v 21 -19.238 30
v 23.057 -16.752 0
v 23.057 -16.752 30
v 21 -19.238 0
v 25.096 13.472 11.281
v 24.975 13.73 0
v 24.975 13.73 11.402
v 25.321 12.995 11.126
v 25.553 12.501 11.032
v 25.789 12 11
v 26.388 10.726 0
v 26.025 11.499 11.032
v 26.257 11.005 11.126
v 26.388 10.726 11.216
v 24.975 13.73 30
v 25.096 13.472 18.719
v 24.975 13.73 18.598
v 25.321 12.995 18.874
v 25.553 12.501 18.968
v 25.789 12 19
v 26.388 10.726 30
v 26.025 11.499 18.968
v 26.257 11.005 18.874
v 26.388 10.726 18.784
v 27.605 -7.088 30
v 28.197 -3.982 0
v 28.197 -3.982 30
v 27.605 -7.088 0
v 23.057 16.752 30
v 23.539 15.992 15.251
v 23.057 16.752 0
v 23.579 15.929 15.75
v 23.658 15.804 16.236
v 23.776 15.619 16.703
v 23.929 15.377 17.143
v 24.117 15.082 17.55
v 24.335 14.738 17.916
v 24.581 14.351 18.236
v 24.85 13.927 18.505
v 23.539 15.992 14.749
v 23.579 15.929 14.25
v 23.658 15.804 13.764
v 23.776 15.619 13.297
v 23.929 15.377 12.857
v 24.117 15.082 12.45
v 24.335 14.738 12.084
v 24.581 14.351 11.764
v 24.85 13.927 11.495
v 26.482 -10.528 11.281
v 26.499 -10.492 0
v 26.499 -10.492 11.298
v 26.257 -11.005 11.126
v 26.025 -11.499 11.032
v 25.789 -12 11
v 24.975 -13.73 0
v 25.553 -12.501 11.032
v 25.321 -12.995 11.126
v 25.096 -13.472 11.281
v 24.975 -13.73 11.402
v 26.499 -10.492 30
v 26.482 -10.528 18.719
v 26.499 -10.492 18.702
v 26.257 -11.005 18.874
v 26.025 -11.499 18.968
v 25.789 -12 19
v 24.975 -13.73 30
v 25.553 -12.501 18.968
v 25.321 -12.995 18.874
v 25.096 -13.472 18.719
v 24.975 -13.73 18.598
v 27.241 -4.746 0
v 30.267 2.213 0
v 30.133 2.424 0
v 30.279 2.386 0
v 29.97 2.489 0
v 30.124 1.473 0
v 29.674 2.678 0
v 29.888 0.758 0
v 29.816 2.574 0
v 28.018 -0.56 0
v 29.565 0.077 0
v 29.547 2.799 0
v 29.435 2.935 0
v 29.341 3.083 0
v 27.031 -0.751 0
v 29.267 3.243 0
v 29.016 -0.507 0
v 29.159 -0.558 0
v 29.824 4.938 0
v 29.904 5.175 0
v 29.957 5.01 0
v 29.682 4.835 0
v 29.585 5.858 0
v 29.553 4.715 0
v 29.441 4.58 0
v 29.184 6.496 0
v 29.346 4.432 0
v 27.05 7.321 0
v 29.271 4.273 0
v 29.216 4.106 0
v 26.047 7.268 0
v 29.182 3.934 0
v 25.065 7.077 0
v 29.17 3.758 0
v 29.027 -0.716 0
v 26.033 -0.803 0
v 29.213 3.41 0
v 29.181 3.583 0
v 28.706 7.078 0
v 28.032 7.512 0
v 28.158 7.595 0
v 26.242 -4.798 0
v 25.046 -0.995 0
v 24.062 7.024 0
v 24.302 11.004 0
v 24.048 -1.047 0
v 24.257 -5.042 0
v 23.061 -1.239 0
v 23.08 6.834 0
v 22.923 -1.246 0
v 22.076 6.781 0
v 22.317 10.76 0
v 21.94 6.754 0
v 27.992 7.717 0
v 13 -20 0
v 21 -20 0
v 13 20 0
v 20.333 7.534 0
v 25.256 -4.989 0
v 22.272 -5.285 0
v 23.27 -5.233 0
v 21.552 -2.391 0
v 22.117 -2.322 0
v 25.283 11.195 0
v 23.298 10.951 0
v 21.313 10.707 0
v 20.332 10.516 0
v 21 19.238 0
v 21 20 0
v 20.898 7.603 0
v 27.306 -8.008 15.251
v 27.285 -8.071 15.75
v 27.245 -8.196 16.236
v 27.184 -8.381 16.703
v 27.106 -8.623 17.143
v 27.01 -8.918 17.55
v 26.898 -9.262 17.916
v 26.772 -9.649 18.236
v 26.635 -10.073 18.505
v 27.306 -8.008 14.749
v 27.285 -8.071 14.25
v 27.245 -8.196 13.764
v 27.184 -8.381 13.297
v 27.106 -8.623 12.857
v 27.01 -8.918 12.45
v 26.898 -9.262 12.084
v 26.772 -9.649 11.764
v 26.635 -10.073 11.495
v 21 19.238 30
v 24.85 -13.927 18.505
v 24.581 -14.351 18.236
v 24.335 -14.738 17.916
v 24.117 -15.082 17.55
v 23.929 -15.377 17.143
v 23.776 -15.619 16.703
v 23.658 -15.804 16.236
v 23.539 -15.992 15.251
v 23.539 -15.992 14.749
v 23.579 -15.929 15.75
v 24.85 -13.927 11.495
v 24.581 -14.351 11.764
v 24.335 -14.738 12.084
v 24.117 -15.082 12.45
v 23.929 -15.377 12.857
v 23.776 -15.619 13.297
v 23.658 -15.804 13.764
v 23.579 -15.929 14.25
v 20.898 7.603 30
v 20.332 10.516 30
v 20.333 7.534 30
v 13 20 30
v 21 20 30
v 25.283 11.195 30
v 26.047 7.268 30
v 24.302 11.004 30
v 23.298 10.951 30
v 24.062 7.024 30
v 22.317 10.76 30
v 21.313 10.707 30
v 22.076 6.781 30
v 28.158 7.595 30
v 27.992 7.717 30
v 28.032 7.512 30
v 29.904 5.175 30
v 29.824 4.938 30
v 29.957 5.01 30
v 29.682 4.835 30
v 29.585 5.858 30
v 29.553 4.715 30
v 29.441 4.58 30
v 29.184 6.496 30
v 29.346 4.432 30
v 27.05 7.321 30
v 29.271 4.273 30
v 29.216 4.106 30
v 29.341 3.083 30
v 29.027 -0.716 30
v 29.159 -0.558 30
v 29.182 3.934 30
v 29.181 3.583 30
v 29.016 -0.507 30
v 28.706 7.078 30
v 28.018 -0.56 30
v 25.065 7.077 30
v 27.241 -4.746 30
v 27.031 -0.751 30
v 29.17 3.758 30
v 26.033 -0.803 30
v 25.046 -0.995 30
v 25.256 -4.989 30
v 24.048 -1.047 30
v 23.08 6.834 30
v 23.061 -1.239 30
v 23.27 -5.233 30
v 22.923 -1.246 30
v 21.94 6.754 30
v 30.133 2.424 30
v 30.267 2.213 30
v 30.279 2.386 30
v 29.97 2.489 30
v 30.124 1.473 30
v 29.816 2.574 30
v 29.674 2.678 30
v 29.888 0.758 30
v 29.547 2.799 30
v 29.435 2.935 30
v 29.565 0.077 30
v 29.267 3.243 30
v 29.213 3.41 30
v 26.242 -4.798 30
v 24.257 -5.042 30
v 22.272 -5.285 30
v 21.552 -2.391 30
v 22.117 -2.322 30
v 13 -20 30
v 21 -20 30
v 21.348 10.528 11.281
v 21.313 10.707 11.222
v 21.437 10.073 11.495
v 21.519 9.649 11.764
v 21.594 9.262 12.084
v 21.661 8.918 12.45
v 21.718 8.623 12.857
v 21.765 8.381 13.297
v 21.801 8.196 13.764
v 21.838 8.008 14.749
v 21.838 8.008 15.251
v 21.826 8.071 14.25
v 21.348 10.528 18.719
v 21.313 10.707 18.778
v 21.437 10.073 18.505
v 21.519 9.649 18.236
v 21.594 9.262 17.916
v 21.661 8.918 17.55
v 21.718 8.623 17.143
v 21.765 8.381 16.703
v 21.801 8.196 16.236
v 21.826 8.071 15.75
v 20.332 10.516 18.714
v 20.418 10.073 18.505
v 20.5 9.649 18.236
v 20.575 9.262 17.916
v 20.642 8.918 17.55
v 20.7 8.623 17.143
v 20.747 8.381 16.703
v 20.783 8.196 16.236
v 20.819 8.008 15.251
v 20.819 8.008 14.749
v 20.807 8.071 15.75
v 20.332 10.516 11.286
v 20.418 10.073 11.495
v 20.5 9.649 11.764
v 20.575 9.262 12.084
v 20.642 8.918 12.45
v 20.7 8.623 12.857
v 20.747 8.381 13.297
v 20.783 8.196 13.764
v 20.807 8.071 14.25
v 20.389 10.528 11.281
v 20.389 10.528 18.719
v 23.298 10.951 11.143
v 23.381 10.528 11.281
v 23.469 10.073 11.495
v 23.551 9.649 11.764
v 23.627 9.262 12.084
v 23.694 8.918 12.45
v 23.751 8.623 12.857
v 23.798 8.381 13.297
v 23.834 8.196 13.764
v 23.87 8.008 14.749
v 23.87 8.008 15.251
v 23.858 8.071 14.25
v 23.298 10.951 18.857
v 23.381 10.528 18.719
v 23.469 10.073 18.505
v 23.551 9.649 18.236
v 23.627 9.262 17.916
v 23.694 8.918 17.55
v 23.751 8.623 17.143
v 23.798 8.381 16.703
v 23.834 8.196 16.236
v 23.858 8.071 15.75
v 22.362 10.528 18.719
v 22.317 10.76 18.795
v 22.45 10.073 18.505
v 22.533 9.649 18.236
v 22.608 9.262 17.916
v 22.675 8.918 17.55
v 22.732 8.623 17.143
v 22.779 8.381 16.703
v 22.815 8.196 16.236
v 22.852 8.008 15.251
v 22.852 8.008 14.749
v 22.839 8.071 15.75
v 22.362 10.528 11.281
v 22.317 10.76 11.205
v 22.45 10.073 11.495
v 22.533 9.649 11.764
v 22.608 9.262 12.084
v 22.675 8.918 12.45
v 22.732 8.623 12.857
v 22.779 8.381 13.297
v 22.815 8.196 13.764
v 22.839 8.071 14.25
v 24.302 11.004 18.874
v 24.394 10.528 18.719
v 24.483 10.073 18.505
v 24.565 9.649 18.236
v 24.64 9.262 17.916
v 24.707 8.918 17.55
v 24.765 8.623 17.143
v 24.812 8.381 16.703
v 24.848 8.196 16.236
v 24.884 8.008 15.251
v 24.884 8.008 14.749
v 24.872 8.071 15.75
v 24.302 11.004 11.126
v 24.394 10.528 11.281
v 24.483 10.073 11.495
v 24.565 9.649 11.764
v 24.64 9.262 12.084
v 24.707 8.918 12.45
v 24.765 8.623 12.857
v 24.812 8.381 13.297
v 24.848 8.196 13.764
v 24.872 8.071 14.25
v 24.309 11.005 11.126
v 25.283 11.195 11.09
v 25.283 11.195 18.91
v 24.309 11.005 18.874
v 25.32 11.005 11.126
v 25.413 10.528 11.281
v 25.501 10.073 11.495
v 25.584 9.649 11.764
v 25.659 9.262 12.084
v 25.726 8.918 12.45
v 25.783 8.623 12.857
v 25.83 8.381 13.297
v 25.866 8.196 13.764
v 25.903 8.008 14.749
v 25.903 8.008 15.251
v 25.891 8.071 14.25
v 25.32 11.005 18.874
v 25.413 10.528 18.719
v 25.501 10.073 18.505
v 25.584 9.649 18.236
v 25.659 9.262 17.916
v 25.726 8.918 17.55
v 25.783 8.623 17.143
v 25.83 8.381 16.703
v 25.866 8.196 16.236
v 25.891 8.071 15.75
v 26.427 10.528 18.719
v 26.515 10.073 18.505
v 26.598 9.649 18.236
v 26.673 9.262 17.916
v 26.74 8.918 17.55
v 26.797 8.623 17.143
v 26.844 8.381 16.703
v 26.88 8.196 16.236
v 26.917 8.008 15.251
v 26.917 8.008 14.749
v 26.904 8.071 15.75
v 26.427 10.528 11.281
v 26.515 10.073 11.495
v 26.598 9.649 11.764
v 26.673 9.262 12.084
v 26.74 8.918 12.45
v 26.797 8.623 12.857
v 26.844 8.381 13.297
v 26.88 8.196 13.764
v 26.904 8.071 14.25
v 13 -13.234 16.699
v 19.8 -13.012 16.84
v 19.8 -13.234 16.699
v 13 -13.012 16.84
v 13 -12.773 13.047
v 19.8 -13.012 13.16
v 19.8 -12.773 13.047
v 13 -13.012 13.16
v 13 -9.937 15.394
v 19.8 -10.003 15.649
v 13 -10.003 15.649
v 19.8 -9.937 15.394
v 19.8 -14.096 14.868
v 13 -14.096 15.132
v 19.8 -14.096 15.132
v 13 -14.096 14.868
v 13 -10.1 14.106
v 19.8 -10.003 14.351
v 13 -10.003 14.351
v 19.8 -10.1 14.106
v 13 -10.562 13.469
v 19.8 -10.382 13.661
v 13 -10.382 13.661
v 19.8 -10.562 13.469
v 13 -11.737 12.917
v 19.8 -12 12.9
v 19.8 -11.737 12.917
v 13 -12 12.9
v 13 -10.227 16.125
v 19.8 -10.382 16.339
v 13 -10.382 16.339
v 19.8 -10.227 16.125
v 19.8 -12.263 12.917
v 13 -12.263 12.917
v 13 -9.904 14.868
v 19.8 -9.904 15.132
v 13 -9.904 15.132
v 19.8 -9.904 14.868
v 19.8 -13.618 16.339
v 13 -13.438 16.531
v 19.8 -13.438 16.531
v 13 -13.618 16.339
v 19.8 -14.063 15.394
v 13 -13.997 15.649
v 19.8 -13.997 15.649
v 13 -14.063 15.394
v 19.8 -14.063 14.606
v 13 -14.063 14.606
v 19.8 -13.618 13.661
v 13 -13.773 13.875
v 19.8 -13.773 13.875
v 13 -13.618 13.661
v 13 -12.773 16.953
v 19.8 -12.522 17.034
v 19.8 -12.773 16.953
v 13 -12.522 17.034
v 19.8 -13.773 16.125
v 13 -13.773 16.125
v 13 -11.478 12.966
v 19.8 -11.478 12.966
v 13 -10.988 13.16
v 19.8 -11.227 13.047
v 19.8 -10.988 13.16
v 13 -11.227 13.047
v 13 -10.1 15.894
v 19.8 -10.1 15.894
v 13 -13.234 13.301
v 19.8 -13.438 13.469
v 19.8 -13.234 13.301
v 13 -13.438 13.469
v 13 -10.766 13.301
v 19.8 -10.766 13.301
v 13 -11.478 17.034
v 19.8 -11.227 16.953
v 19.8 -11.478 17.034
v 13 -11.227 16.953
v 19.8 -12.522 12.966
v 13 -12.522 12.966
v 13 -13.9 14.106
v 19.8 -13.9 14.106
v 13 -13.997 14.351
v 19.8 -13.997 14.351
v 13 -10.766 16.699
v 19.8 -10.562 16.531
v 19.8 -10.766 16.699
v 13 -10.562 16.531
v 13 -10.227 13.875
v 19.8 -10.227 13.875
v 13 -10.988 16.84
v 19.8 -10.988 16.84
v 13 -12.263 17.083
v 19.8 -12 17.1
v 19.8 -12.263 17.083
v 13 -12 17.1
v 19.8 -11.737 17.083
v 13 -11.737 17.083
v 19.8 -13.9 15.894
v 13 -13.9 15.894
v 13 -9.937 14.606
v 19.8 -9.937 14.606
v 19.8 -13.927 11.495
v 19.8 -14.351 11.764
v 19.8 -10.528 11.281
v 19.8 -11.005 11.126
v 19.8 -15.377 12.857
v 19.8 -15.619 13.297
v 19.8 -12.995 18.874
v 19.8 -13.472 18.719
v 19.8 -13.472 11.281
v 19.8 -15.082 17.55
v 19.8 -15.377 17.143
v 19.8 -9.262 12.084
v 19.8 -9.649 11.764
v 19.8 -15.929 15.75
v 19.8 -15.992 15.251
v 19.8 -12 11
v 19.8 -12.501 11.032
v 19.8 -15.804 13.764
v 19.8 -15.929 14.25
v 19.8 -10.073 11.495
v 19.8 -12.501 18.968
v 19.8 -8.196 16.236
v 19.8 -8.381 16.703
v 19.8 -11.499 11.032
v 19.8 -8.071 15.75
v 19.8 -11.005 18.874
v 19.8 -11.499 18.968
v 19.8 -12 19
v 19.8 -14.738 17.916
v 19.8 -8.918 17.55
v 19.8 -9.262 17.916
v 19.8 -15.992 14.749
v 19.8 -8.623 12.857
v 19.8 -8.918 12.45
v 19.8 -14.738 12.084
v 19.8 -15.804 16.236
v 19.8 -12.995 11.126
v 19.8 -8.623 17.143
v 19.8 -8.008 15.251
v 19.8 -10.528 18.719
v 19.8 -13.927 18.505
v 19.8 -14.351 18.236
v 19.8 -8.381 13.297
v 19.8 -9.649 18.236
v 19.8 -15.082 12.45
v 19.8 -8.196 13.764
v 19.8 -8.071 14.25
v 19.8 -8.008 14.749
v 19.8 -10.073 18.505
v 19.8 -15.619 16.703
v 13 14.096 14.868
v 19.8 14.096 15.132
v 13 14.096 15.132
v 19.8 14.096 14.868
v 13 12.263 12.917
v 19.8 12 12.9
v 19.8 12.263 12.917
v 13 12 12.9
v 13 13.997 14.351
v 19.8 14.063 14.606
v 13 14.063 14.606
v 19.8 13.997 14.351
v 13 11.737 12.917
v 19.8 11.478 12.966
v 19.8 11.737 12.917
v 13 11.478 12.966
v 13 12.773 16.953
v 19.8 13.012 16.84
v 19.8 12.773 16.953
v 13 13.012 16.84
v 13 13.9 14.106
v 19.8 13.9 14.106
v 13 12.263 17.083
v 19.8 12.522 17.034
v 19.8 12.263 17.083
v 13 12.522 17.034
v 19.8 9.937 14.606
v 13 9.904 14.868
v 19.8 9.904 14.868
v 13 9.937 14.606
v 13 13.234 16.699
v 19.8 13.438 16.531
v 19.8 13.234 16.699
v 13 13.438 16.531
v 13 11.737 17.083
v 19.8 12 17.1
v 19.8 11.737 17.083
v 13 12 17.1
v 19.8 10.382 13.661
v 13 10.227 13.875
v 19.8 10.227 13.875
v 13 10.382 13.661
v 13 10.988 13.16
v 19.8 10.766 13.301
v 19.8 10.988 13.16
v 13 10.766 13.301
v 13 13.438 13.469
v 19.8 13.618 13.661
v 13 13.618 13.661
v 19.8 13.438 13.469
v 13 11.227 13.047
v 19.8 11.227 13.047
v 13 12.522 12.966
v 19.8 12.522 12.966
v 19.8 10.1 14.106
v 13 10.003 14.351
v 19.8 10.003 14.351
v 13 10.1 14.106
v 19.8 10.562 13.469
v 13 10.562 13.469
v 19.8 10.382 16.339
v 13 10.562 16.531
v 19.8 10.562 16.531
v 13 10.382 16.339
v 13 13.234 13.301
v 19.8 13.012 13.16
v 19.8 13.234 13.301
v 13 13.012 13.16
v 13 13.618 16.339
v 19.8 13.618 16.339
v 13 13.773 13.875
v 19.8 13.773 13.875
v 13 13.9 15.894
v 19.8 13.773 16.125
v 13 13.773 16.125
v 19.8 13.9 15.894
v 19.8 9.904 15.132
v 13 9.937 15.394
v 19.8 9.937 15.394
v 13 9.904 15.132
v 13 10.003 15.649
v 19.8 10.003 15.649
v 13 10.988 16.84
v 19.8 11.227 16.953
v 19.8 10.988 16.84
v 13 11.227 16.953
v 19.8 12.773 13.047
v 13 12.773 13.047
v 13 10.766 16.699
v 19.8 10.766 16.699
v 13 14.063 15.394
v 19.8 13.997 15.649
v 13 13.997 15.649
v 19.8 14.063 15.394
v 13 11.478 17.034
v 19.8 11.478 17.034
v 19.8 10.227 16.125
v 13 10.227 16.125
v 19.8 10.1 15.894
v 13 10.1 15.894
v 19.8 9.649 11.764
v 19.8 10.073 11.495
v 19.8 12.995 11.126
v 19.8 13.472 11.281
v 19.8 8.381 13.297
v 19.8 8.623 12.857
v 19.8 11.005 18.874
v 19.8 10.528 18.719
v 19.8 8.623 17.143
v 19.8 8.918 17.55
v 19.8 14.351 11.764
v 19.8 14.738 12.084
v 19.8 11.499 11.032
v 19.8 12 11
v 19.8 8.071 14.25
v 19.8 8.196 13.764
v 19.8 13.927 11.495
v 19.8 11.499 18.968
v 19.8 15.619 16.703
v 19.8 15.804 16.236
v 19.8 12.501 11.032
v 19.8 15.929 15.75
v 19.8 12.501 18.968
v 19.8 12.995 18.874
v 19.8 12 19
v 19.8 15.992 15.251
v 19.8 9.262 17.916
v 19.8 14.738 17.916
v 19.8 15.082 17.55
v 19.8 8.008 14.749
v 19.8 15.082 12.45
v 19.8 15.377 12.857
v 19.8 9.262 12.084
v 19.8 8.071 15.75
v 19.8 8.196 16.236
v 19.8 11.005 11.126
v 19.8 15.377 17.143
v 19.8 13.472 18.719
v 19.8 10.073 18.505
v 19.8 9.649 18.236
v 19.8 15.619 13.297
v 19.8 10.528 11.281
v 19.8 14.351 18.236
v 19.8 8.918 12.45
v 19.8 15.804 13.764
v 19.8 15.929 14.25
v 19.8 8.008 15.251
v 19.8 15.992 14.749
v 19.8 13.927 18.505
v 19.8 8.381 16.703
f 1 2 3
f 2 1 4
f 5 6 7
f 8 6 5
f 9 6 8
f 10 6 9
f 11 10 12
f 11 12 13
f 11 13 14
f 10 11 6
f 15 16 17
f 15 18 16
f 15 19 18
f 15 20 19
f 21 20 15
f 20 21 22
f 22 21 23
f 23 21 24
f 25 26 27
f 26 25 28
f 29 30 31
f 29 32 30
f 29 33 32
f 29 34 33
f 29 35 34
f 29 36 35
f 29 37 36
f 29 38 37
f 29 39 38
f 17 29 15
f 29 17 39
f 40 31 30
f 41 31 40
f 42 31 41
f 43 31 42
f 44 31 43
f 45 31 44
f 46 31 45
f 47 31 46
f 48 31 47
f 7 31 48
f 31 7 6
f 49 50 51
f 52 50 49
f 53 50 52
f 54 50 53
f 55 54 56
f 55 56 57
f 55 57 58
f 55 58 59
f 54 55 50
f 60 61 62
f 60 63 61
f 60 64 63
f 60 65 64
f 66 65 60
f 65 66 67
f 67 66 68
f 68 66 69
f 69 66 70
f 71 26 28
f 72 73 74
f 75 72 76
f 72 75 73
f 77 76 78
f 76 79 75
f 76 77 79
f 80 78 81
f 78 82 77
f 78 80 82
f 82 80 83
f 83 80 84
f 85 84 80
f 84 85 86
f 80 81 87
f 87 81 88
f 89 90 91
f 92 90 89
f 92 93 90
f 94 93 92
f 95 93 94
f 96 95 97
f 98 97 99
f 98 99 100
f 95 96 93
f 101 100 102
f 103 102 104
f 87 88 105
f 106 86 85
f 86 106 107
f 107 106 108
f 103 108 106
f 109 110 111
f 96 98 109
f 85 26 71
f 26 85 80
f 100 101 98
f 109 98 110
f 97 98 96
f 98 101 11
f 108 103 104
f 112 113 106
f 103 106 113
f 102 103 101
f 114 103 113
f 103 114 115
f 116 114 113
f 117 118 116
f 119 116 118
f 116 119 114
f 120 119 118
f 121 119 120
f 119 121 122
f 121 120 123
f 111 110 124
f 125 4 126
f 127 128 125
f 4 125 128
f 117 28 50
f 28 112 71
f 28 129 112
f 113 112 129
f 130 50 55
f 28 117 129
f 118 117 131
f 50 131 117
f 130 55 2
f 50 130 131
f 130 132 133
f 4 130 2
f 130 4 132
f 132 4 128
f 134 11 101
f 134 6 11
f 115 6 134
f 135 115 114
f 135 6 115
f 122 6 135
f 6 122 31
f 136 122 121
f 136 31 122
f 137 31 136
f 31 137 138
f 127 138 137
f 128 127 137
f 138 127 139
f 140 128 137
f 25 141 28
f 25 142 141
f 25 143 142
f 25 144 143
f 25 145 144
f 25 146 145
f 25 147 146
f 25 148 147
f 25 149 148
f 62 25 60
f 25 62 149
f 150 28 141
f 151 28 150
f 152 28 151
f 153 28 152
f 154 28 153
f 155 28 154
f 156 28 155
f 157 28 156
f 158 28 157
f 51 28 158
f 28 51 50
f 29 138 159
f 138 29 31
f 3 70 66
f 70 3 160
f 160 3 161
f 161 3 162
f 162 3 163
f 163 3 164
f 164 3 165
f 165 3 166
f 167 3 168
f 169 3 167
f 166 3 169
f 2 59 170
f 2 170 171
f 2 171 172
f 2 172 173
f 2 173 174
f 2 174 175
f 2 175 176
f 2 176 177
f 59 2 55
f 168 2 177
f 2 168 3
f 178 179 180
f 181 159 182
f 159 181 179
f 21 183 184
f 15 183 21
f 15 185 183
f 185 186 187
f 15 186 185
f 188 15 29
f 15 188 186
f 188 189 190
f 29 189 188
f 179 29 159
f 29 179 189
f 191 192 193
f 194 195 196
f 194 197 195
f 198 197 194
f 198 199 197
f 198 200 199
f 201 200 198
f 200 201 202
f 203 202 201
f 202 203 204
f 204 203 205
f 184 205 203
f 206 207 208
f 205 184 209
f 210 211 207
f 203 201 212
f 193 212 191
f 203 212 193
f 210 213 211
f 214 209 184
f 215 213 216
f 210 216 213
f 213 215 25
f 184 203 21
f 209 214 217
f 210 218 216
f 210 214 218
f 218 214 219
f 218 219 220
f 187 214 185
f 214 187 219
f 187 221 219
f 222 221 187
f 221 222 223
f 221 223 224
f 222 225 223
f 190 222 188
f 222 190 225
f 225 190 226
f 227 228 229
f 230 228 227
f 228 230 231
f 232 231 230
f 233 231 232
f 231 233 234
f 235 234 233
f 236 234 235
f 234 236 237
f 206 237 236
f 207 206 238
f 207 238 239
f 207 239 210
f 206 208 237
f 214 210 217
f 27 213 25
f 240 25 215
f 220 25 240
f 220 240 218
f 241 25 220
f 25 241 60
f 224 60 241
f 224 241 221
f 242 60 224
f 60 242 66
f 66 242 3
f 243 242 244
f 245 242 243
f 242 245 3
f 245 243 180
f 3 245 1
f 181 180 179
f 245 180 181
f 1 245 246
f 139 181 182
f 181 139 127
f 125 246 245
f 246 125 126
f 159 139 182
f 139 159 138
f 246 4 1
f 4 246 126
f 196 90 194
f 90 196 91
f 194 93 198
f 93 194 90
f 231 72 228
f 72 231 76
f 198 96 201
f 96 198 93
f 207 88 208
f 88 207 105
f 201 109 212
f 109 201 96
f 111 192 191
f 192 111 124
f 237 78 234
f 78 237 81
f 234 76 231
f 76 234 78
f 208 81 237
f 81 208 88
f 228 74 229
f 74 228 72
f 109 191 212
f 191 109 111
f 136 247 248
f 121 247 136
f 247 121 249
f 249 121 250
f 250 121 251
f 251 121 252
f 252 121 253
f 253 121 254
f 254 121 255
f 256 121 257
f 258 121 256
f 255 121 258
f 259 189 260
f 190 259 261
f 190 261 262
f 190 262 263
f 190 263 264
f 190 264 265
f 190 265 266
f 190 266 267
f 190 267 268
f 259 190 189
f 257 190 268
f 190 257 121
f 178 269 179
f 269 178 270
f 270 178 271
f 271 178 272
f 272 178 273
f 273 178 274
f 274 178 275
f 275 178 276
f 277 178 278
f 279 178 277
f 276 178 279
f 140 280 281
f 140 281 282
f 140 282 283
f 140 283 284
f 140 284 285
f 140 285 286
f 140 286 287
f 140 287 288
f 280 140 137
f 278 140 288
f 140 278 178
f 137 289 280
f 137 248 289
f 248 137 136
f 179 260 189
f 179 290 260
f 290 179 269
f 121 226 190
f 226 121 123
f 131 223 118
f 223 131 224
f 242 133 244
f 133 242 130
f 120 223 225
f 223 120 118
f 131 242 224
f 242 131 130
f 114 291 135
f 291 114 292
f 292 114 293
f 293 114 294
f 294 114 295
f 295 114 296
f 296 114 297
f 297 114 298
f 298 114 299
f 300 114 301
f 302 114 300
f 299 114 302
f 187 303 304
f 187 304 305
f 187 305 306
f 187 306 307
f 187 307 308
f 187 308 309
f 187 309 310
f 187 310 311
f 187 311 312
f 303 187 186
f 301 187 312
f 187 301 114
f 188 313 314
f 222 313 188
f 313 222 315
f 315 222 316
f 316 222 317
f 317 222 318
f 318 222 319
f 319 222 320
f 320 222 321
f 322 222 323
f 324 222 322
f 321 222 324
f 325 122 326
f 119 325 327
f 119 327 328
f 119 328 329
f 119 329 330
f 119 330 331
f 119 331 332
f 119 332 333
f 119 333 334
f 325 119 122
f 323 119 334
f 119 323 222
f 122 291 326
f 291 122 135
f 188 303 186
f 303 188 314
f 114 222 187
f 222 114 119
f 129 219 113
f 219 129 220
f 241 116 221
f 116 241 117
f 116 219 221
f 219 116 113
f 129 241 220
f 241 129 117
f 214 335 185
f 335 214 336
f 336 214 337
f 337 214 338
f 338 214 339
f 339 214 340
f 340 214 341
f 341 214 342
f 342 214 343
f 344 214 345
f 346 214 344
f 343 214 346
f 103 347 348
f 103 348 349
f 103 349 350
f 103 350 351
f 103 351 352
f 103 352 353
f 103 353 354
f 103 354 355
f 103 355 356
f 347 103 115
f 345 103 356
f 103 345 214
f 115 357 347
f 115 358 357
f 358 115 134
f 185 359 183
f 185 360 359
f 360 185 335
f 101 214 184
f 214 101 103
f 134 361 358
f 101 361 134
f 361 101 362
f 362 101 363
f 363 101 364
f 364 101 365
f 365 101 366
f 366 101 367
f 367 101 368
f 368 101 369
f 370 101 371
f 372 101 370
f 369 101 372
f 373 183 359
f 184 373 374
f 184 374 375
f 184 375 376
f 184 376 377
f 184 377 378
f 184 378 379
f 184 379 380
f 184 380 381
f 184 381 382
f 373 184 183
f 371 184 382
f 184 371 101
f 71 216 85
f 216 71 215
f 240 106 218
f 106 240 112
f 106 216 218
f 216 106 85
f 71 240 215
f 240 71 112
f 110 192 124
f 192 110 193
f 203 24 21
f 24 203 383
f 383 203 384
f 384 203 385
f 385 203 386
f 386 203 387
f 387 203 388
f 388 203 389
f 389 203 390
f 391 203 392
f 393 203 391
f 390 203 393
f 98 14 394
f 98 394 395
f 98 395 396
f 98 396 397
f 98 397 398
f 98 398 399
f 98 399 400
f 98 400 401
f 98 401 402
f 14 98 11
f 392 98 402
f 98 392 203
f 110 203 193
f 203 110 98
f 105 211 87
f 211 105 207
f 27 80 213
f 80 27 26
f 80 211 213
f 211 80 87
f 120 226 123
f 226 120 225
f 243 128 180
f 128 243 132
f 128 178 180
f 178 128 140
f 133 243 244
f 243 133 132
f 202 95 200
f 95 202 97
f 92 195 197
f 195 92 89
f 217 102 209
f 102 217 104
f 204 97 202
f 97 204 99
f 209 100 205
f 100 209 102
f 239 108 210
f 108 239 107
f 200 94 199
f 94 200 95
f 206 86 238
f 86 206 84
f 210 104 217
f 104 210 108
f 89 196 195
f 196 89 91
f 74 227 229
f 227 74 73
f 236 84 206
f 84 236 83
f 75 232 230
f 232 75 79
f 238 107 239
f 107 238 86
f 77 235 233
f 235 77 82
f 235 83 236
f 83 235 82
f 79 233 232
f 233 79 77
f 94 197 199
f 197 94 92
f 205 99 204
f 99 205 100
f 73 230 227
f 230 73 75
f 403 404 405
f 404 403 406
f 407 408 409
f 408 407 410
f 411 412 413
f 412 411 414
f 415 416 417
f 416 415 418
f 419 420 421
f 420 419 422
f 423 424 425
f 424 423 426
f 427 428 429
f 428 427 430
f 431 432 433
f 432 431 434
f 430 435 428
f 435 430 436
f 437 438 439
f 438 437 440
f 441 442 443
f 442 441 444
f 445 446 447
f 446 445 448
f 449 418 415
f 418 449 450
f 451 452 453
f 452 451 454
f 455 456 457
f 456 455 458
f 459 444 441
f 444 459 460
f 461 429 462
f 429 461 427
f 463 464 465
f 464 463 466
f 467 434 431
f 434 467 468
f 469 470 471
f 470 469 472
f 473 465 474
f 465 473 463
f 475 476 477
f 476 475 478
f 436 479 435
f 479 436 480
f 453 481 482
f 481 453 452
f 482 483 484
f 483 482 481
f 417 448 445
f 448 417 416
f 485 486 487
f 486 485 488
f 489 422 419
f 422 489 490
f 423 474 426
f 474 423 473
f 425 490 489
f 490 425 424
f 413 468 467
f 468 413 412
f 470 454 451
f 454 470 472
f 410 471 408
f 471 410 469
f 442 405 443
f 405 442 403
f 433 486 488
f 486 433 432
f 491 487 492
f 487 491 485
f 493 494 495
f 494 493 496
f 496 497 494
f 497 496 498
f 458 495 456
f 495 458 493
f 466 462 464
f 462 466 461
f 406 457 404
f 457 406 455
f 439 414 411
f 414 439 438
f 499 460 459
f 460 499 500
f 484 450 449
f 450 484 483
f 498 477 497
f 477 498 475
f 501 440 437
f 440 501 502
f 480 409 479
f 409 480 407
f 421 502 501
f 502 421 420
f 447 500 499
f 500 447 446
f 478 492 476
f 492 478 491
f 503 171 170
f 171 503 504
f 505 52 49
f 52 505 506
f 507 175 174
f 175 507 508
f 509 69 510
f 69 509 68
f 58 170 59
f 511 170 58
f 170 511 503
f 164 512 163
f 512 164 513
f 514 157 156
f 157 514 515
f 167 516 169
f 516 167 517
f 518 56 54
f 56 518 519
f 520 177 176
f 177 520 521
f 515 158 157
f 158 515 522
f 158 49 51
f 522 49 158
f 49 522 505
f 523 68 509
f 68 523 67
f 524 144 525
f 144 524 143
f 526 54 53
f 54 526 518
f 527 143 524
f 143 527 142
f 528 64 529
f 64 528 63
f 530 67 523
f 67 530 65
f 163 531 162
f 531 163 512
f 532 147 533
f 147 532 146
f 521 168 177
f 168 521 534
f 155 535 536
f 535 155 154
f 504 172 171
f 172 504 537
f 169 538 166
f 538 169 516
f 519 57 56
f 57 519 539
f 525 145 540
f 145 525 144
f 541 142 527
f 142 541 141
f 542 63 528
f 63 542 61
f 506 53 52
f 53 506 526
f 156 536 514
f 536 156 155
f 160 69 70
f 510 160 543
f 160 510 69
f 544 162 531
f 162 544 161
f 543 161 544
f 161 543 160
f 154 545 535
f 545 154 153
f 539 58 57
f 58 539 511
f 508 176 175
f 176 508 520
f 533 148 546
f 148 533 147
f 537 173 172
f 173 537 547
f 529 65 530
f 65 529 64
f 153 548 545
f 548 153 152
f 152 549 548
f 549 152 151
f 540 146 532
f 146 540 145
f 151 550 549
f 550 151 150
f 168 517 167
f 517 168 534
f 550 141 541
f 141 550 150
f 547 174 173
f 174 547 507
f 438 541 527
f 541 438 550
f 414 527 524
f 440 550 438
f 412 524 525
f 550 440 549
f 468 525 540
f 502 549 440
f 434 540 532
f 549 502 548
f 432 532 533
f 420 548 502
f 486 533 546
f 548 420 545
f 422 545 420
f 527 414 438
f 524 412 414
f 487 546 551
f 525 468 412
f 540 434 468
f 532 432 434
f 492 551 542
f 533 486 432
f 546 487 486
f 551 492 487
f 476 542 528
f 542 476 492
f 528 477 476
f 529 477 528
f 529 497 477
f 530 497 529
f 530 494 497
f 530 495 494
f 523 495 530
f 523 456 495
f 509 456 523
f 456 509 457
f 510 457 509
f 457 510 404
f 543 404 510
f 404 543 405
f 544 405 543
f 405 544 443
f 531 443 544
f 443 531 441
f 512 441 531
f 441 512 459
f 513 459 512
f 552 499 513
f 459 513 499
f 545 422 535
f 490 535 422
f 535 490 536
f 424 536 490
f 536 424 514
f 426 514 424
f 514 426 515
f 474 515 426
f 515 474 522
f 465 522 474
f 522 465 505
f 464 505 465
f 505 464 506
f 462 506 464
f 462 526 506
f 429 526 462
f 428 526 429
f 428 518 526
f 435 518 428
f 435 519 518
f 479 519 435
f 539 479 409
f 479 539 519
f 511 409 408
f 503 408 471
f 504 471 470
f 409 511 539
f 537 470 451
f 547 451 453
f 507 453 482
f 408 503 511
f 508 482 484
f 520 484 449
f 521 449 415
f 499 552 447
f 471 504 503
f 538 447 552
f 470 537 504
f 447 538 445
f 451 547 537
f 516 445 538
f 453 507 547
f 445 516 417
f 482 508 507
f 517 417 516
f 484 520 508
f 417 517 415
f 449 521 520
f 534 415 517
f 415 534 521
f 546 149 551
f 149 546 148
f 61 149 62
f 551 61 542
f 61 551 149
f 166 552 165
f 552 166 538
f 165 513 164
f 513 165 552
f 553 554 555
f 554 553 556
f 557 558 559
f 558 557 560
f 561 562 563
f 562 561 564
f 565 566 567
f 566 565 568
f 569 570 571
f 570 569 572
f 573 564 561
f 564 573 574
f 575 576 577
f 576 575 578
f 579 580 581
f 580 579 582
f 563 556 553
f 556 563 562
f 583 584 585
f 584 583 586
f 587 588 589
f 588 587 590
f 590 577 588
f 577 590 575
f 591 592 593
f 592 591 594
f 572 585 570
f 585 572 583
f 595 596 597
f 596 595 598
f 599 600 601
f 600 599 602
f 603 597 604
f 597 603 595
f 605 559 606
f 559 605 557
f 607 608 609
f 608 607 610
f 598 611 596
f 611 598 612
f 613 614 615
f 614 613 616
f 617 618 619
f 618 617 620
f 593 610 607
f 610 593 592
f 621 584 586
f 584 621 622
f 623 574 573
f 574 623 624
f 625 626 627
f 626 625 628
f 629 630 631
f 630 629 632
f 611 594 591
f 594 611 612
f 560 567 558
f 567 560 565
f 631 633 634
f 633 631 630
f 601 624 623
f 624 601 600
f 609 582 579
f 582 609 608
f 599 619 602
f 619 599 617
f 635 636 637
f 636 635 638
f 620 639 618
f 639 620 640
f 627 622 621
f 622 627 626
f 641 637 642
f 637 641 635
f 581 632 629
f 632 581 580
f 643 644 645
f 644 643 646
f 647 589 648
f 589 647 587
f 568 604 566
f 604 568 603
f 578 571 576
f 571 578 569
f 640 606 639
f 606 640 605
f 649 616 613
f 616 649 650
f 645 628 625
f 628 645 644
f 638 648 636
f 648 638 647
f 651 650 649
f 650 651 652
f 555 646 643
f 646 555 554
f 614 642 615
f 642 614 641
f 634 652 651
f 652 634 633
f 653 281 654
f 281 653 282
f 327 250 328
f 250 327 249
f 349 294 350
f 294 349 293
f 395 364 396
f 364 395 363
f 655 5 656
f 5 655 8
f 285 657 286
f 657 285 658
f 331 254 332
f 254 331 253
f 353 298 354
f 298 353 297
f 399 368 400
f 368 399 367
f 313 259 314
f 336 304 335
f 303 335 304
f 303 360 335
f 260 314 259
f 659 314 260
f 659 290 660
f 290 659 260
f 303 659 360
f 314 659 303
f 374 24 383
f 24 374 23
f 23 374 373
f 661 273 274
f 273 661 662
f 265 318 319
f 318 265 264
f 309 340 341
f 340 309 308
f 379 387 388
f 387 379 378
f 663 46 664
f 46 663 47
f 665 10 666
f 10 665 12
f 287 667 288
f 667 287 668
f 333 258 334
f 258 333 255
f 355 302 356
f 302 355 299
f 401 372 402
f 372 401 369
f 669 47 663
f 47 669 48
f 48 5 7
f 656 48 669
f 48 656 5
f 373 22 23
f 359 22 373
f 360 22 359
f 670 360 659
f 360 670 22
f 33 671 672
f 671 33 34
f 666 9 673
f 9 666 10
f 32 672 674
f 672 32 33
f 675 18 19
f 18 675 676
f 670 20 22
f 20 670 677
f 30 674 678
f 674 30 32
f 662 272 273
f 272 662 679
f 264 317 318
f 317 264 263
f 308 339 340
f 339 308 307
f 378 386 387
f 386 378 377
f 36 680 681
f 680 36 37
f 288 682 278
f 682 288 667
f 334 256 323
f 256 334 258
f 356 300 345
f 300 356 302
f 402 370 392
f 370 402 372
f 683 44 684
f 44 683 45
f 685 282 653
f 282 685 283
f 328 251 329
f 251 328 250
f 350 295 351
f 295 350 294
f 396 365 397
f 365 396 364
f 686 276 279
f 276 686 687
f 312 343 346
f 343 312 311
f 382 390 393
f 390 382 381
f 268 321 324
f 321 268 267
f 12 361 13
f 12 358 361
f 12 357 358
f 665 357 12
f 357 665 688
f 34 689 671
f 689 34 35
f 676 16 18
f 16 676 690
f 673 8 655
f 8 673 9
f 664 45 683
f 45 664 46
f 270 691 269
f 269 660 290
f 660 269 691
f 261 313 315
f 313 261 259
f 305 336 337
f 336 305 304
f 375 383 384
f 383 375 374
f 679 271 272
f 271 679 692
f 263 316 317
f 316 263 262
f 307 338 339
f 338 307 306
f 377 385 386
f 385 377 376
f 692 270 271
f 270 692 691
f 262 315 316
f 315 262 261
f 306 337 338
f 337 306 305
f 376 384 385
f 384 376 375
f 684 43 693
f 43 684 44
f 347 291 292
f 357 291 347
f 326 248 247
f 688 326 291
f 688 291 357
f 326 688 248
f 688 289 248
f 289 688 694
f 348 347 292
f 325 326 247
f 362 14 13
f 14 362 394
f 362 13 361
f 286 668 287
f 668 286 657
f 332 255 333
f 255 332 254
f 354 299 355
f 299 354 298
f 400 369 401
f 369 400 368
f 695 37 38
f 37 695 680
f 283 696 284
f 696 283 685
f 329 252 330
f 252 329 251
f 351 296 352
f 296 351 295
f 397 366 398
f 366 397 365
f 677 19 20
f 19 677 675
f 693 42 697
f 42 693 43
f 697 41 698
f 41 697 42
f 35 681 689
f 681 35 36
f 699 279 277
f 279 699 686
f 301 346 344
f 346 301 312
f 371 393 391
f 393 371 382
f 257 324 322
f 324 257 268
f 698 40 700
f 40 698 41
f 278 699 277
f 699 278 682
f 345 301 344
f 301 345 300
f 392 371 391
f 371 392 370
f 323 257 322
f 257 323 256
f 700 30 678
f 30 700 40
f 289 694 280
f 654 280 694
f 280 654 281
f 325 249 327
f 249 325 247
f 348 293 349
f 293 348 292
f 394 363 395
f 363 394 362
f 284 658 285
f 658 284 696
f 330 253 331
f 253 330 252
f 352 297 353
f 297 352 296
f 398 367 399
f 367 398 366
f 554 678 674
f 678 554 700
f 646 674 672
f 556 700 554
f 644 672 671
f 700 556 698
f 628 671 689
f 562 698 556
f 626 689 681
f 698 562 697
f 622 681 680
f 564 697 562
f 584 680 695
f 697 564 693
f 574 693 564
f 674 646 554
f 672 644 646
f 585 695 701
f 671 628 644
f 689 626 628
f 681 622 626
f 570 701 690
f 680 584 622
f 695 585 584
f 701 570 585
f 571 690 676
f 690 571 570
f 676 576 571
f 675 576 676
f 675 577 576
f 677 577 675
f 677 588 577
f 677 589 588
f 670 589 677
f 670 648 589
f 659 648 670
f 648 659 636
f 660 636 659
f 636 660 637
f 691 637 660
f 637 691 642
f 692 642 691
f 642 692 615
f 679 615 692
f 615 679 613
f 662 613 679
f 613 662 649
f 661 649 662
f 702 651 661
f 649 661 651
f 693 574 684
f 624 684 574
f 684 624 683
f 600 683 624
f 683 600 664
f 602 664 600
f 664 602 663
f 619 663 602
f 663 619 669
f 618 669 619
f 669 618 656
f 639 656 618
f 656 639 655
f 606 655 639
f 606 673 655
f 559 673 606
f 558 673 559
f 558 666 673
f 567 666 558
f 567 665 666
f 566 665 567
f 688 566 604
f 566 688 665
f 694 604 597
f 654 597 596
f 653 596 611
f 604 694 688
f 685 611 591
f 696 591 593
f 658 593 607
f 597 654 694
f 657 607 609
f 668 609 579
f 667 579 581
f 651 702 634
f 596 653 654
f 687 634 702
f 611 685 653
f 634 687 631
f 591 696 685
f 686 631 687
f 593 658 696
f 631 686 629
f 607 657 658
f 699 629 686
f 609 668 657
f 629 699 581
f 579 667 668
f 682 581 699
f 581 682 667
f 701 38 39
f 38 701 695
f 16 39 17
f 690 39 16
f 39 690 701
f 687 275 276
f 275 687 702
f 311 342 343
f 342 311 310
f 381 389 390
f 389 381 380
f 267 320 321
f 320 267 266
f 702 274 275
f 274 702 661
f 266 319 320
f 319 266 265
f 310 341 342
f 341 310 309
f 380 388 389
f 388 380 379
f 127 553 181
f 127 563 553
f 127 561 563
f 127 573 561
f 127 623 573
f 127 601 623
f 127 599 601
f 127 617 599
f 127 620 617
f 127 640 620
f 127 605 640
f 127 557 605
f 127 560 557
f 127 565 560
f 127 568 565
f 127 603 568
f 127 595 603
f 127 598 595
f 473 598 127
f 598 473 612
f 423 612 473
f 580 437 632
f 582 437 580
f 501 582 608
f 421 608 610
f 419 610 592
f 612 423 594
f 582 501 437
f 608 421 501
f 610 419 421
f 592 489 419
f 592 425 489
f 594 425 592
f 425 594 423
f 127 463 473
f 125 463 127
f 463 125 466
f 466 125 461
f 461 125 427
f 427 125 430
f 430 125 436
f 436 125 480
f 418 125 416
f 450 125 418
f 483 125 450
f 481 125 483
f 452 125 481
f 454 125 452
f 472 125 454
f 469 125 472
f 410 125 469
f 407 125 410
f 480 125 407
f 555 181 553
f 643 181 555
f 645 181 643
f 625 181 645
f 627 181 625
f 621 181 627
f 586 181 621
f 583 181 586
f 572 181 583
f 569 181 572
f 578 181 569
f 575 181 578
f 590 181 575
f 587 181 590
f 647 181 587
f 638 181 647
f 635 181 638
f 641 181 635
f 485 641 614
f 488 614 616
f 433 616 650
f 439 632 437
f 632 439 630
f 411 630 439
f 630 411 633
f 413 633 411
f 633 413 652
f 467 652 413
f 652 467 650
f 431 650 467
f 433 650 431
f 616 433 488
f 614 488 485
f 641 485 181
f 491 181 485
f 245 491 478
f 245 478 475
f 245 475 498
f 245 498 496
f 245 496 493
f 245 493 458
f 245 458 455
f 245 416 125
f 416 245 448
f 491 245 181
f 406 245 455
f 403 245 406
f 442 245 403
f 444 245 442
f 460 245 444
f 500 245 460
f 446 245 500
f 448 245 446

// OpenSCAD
$fn=50+0;

// Choose which part to generate
Mode = "Part1"; // [Part1,Part2,Part3]

// Mid way angle - affect Part 1
MidAngle = 7; // [0:0.5:8]

// Nut & bolt hole radius - affect all parts
BoltRadius = 2; // [1:0.1:3]

// Bolt cap radius - affect Part 1
BoltCapRadius = 3.5; // [3:0.1:5]

// Nut hexagon maximal radius - affect Part 3
NutMaxRadius = 3.95; // [3:0.05:6]

if (Mode == "Part1") {
    part1();
} else {
    if (Mode == "Part2") {
        part2();
    } else {
        part3();    
        }
    }

module part2()
{
    difference(){
        translate([-8,-20,0])cube([15+7,40,20]);
        translate([50+(15+6.5-8.2),0,0])rotate(2,[0,0,1])cube(100,center=true);
        translate([0,0,-1])cylinder(h=30,r=5.5);
        translate([-26,-5.5,-1])cube([26,11,30]);
        translate([-50,-12,10])rotate(90,[0,1,0])cylinder(h=100,r=BoltRadius+0.1);
        translate([-50,+12,10])rotate(90,[0,1,0])cylinder(h=100,r=BoltRadius+0.1);
    }
}


module part1(alpha = MidAngle)
{
    
difference(){
    
union()
    {
difference(){
cylinder(h=30,r=28.5);
rotate(90,[0,0,1])translate([0,0,-1])cube(500);
rotate(179,[0,0,1])translate([0,0,-1])cube(500);
rotate(220,[0,0,1])translate([0,0,-1])cube(500);
}

difference(){
translate([-1,-20,0])cube([17,40,30]);
translate([0,0,-1])cylinder(h=32,r=5);
translate([-26,-5,-1])cube([26,10,32]);}

translate([13,-20,0])cube([8,40,30]);

rotate(alpha,[0,0,1])translate([24.5,0,0])cylinder(h=30,r=6);

}

  translate([-50,-12,15])rotate(90,[0,1,0])cylinder(h=100,r=BoltRadius+0.1);
  translate([19.8,-12,15])rotate(90,[0,1,0])cylinder(h=100,r=BoltCapRadius+0.5);
  translate([-50,+12,15])rotate(90,[0,1,0])cylinder(h=100,r=BoltRadius+0.1);
  translate([19.8,+12,15])rotate(90,[0,1,0])cylinder(h=100,r=BoltCapRadius+0.5);

  translate([0,-270,0])cube(500,center=true);
  translate([0,+270,0])cube(500,center=true);
  translate([-250+13,0,0])cube(500,center=true);

  move = 2.1;
  rotate(alpha,[0,0,1]){
      for(i = [(20+move): 2 : (26+move)]){
          translate([i,6,15])rotate(4,[0,0,1])cube([1,4,32],center=true);
          translate([i,-6,15])rotate(-4,[0,0,1])cube([1,4,32],center=true);
      }
          translate([19.+move,-5,-1])cube([1.5,10,32]);
      translate([30.8,0,-1])cylinder(h=32,r=1.4);
  }
}
}

module part3()
{
    rotate(-90,[0,1,0])
    difference()
    {
        union()
        {
    translate([-20,-25,0])cube([12,50,20]);
    translate([-20,-25,-5])cube([7,50,30]);
    translate([-19,-10/2,0])cube([12,10,20]);
    translate([-19,-4.9/2+22.55,0])cube([12,4.9,20]);            
    translate([-19,-4.9/2-22.55,0])cube([12,4.9,20]);            
        }

translate([0,0,-1])cylinder(h=30,r=5);        

        translate([-50,-12,10])rotate(90,[0,1,0])cylinder(h=100,r=BoltRadius+0.1);
        translate([-17.5,-12,10])rotate(0,[1,0,0])cube([6,NutMaxRadius+0.05,(NutMaxRadius+0.05)*1.73],center=true);
        translate([-17.5,-12,10])rotate(60,[1,0,0])cube([6,NutMaxRadius+0.05,(NutMaxRadius+0.05)*1.73],center=true);
        translate([-17.5,-12,10])rotate(120,[1,0,0])cube([6,NutMaxRadius+0.05,(NutMaxRadius+0.05)*1.73],center=true);
        translate([-50,+12,10])rotate(90,[0,1,0])cylinder(h=100,r=BoltRadius+0.1);
        translate([-17.5,+12,10])rotate(0,[1,0,0])cube([6,NutMaxRadius+0.05,(NutMaxRadius+0.05)*1.73],center=true);
        translate([-17.5,+12,10])rotate(60,[1,0,0])cube([6,NutMaxRadius+0.05,(NutMaxRadius+0.05)*1.73],center=true);
        translate([-17.5,+12,10])rotate(120,[1,0,0])cube([6,NutMaxRadius+0.05,(NutMaxRadius+0.05)*1.73],center=true);
    }
}
